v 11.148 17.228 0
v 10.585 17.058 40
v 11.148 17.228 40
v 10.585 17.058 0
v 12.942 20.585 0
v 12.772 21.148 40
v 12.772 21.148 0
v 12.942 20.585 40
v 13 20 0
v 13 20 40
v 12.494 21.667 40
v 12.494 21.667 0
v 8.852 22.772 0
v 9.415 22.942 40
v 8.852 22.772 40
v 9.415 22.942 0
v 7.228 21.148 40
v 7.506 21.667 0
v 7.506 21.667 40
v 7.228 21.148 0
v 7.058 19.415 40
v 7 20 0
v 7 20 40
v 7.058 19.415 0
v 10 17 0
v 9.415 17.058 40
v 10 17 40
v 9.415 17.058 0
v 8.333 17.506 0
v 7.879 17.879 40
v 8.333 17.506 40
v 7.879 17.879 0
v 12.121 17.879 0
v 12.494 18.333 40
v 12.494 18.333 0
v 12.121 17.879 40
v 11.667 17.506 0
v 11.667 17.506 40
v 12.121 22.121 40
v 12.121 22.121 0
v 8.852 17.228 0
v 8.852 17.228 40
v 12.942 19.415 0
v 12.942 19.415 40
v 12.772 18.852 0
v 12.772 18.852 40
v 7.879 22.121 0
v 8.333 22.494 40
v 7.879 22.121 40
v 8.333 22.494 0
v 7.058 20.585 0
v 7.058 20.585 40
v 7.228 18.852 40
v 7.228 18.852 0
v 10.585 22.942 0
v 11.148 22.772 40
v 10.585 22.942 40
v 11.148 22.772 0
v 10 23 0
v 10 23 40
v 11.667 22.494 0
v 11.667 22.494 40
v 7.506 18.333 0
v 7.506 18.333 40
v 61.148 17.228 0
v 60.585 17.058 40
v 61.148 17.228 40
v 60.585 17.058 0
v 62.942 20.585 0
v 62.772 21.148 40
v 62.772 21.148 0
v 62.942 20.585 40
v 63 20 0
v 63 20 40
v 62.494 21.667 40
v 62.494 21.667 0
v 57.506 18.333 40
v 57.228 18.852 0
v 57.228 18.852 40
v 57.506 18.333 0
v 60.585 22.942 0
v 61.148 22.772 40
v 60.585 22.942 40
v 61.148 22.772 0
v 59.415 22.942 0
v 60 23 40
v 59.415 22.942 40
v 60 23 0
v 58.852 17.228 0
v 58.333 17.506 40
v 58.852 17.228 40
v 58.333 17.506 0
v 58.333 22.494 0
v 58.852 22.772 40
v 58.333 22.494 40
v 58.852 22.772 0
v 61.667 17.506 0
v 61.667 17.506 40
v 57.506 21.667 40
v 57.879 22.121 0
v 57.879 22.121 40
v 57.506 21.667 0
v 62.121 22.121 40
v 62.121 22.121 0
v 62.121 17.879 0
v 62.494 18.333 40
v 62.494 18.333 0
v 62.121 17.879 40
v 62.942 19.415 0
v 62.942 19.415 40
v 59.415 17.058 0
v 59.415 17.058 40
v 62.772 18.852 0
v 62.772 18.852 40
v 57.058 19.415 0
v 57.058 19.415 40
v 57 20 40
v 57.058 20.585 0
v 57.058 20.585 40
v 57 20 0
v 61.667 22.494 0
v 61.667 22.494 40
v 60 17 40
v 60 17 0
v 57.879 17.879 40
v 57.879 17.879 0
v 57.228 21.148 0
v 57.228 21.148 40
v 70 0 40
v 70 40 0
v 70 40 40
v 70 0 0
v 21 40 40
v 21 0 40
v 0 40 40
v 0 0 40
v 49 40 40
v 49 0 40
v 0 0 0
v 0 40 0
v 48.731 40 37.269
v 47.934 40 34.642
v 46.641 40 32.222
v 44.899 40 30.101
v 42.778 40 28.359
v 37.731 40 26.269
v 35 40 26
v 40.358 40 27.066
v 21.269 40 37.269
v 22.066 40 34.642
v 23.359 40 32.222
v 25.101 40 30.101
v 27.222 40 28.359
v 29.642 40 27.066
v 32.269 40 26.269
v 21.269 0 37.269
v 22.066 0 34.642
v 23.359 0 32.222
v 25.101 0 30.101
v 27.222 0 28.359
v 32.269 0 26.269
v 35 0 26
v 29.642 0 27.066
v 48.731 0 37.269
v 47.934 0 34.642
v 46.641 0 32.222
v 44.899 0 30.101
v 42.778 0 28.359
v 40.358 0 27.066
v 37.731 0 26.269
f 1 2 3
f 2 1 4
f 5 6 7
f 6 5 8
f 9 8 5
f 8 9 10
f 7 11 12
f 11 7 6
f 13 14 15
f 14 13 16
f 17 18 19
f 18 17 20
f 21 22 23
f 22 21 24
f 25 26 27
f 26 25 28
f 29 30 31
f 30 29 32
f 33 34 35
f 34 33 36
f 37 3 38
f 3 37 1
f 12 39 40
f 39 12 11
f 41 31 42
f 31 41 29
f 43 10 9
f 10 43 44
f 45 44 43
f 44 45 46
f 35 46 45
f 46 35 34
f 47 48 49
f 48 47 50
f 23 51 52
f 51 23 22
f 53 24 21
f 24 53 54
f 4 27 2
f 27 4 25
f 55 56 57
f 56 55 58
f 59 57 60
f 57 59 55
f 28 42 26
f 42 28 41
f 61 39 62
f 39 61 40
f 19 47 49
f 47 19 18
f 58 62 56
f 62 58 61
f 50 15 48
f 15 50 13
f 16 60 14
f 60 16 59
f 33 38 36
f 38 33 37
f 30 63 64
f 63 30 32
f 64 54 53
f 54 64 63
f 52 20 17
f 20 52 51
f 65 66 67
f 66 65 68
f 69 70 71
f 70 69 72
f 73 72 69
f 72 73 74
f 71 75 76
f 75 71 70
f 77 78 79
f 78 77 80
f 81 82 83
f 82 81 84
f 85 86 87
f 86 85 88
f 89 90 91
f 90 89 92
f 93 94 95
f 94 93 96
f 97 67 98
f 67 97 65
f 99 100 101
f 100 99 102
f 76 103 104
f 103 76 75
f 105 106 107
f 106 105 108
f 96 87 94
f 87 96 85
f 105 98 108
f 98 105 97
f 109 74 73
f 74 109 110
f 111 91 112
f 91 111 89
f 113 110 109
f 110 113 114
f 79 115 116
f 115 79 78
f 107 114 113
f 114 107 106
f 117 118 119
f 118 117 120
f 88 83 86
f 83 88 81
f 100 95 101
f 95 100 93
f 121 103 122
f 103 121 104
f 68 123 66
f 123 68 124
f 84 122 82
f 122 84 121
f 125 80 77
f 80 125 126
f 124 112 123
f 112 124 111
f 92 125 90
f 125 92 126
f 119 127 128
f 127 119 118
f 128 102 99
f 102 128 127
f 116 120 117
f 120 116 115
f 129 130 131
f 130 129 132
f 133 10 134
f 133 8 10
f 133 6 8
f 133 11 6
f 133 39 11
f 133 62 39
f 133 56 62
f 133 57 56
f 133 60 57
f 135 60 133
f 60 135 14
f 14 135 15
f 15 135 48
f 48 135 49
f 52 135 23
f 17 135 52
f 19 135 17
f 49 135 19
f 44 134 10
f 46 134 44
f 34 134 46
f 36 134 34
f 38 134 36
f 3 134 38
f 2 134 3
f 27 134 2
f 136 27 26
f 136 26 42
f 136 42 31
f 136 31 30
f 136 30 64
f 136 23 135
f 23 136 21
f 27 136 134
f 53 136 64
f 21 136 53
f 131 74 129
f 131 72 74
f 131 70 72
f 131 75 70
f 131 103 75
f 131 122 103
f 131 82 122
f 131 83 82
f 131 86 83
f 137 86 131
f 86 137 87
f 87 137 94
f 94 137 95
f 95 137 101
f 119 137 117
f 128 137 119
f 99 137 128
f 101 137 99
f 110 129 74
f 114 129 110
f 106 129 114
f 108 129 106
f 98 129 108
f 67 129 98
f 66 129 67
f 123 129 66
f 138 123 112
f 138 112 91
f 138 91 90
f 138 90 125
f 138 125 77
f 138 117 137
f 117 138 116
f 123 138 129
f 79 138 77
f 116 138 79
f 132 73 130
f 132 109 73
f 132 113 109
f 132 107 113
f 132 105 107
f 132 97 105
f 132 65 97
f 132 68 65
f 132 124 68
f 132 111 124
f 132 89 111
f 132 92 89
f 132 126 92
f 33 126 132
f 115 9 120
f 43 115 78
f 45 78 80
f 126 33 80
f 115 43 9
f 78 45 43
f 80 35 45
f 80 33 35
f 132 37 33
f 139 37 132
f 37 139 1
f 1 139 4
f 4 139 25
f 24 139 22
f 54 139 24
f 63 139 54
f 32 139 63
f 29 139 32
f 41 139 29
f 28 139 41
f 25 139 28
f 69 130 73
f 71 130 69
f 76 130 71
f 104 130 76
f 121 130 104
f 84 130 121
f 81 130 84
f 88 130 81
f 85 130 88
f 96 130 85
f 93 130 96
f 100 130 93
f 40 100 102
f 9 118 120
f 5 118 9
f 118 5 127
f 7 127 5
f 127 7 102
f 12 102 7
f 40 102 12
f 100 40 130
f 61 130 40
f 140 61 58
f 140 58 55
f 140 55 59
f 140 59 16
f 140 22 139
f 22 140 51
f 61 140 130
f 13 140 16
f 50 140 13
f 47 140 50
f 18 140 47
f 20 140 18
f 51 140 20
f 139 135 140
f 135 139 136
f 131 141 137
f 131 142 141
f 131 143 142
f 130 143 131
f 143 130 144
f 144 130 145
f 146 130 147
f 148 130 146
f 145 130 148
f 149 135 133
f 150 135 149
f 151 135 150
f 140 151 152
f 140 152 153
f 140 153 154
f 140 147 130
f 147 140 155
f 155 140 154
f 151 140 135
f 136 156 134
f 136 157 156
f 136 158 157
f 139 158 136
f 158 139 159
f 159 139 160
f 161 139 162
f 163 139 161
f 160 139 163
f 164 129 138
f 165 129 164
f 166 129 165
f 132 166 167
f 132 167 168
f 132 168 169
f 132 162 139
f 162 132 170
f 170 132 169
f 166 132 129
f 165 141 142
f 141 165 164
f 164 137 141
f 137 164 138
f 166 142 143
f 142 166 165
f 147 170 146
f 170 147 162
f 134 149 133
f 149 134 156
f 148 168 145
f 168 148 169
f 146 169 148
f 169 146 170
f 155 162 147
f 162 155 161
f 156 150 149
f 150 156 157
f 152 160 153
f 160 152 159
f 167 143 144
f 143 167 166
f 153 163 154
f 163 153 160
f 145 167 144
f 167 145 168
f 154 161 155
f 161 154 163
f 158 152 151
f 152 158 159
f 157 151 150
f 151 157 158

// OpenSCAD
$fn = 32;

// ----------------------------------------------------------------------
// Saddle clamp: plain shaft clamp
// ----------------------------------------------------------------------

// --- parameters (mm) ---
blk_l = 70;               // block length, X
blk_w = 40;               // block width, Y
blk_h = 40;               // block height
clamp_r = 14;             // shaft groove radius
hole_r = 3;               // bolt hole radius
hole_m = 10;              // bolt hole margin from the ends

saw_depth = clamp_r + 3;  // saw kerf depth

difference() {
  cube([blk_l, blk_w, blk_h]);
  translate([blk_l / 2, -1, blk_h])
    rotate([-90, 0, 0])
      cylinder(h = blk_w + 2, r = clamp_r);
  for (sx = [0, 1])
    translate([sx ? blk_l - hole_m : hole_m, blk_w / 2, -1])
      cylinder(r = hole_r, h = blk_h + 2);
}
